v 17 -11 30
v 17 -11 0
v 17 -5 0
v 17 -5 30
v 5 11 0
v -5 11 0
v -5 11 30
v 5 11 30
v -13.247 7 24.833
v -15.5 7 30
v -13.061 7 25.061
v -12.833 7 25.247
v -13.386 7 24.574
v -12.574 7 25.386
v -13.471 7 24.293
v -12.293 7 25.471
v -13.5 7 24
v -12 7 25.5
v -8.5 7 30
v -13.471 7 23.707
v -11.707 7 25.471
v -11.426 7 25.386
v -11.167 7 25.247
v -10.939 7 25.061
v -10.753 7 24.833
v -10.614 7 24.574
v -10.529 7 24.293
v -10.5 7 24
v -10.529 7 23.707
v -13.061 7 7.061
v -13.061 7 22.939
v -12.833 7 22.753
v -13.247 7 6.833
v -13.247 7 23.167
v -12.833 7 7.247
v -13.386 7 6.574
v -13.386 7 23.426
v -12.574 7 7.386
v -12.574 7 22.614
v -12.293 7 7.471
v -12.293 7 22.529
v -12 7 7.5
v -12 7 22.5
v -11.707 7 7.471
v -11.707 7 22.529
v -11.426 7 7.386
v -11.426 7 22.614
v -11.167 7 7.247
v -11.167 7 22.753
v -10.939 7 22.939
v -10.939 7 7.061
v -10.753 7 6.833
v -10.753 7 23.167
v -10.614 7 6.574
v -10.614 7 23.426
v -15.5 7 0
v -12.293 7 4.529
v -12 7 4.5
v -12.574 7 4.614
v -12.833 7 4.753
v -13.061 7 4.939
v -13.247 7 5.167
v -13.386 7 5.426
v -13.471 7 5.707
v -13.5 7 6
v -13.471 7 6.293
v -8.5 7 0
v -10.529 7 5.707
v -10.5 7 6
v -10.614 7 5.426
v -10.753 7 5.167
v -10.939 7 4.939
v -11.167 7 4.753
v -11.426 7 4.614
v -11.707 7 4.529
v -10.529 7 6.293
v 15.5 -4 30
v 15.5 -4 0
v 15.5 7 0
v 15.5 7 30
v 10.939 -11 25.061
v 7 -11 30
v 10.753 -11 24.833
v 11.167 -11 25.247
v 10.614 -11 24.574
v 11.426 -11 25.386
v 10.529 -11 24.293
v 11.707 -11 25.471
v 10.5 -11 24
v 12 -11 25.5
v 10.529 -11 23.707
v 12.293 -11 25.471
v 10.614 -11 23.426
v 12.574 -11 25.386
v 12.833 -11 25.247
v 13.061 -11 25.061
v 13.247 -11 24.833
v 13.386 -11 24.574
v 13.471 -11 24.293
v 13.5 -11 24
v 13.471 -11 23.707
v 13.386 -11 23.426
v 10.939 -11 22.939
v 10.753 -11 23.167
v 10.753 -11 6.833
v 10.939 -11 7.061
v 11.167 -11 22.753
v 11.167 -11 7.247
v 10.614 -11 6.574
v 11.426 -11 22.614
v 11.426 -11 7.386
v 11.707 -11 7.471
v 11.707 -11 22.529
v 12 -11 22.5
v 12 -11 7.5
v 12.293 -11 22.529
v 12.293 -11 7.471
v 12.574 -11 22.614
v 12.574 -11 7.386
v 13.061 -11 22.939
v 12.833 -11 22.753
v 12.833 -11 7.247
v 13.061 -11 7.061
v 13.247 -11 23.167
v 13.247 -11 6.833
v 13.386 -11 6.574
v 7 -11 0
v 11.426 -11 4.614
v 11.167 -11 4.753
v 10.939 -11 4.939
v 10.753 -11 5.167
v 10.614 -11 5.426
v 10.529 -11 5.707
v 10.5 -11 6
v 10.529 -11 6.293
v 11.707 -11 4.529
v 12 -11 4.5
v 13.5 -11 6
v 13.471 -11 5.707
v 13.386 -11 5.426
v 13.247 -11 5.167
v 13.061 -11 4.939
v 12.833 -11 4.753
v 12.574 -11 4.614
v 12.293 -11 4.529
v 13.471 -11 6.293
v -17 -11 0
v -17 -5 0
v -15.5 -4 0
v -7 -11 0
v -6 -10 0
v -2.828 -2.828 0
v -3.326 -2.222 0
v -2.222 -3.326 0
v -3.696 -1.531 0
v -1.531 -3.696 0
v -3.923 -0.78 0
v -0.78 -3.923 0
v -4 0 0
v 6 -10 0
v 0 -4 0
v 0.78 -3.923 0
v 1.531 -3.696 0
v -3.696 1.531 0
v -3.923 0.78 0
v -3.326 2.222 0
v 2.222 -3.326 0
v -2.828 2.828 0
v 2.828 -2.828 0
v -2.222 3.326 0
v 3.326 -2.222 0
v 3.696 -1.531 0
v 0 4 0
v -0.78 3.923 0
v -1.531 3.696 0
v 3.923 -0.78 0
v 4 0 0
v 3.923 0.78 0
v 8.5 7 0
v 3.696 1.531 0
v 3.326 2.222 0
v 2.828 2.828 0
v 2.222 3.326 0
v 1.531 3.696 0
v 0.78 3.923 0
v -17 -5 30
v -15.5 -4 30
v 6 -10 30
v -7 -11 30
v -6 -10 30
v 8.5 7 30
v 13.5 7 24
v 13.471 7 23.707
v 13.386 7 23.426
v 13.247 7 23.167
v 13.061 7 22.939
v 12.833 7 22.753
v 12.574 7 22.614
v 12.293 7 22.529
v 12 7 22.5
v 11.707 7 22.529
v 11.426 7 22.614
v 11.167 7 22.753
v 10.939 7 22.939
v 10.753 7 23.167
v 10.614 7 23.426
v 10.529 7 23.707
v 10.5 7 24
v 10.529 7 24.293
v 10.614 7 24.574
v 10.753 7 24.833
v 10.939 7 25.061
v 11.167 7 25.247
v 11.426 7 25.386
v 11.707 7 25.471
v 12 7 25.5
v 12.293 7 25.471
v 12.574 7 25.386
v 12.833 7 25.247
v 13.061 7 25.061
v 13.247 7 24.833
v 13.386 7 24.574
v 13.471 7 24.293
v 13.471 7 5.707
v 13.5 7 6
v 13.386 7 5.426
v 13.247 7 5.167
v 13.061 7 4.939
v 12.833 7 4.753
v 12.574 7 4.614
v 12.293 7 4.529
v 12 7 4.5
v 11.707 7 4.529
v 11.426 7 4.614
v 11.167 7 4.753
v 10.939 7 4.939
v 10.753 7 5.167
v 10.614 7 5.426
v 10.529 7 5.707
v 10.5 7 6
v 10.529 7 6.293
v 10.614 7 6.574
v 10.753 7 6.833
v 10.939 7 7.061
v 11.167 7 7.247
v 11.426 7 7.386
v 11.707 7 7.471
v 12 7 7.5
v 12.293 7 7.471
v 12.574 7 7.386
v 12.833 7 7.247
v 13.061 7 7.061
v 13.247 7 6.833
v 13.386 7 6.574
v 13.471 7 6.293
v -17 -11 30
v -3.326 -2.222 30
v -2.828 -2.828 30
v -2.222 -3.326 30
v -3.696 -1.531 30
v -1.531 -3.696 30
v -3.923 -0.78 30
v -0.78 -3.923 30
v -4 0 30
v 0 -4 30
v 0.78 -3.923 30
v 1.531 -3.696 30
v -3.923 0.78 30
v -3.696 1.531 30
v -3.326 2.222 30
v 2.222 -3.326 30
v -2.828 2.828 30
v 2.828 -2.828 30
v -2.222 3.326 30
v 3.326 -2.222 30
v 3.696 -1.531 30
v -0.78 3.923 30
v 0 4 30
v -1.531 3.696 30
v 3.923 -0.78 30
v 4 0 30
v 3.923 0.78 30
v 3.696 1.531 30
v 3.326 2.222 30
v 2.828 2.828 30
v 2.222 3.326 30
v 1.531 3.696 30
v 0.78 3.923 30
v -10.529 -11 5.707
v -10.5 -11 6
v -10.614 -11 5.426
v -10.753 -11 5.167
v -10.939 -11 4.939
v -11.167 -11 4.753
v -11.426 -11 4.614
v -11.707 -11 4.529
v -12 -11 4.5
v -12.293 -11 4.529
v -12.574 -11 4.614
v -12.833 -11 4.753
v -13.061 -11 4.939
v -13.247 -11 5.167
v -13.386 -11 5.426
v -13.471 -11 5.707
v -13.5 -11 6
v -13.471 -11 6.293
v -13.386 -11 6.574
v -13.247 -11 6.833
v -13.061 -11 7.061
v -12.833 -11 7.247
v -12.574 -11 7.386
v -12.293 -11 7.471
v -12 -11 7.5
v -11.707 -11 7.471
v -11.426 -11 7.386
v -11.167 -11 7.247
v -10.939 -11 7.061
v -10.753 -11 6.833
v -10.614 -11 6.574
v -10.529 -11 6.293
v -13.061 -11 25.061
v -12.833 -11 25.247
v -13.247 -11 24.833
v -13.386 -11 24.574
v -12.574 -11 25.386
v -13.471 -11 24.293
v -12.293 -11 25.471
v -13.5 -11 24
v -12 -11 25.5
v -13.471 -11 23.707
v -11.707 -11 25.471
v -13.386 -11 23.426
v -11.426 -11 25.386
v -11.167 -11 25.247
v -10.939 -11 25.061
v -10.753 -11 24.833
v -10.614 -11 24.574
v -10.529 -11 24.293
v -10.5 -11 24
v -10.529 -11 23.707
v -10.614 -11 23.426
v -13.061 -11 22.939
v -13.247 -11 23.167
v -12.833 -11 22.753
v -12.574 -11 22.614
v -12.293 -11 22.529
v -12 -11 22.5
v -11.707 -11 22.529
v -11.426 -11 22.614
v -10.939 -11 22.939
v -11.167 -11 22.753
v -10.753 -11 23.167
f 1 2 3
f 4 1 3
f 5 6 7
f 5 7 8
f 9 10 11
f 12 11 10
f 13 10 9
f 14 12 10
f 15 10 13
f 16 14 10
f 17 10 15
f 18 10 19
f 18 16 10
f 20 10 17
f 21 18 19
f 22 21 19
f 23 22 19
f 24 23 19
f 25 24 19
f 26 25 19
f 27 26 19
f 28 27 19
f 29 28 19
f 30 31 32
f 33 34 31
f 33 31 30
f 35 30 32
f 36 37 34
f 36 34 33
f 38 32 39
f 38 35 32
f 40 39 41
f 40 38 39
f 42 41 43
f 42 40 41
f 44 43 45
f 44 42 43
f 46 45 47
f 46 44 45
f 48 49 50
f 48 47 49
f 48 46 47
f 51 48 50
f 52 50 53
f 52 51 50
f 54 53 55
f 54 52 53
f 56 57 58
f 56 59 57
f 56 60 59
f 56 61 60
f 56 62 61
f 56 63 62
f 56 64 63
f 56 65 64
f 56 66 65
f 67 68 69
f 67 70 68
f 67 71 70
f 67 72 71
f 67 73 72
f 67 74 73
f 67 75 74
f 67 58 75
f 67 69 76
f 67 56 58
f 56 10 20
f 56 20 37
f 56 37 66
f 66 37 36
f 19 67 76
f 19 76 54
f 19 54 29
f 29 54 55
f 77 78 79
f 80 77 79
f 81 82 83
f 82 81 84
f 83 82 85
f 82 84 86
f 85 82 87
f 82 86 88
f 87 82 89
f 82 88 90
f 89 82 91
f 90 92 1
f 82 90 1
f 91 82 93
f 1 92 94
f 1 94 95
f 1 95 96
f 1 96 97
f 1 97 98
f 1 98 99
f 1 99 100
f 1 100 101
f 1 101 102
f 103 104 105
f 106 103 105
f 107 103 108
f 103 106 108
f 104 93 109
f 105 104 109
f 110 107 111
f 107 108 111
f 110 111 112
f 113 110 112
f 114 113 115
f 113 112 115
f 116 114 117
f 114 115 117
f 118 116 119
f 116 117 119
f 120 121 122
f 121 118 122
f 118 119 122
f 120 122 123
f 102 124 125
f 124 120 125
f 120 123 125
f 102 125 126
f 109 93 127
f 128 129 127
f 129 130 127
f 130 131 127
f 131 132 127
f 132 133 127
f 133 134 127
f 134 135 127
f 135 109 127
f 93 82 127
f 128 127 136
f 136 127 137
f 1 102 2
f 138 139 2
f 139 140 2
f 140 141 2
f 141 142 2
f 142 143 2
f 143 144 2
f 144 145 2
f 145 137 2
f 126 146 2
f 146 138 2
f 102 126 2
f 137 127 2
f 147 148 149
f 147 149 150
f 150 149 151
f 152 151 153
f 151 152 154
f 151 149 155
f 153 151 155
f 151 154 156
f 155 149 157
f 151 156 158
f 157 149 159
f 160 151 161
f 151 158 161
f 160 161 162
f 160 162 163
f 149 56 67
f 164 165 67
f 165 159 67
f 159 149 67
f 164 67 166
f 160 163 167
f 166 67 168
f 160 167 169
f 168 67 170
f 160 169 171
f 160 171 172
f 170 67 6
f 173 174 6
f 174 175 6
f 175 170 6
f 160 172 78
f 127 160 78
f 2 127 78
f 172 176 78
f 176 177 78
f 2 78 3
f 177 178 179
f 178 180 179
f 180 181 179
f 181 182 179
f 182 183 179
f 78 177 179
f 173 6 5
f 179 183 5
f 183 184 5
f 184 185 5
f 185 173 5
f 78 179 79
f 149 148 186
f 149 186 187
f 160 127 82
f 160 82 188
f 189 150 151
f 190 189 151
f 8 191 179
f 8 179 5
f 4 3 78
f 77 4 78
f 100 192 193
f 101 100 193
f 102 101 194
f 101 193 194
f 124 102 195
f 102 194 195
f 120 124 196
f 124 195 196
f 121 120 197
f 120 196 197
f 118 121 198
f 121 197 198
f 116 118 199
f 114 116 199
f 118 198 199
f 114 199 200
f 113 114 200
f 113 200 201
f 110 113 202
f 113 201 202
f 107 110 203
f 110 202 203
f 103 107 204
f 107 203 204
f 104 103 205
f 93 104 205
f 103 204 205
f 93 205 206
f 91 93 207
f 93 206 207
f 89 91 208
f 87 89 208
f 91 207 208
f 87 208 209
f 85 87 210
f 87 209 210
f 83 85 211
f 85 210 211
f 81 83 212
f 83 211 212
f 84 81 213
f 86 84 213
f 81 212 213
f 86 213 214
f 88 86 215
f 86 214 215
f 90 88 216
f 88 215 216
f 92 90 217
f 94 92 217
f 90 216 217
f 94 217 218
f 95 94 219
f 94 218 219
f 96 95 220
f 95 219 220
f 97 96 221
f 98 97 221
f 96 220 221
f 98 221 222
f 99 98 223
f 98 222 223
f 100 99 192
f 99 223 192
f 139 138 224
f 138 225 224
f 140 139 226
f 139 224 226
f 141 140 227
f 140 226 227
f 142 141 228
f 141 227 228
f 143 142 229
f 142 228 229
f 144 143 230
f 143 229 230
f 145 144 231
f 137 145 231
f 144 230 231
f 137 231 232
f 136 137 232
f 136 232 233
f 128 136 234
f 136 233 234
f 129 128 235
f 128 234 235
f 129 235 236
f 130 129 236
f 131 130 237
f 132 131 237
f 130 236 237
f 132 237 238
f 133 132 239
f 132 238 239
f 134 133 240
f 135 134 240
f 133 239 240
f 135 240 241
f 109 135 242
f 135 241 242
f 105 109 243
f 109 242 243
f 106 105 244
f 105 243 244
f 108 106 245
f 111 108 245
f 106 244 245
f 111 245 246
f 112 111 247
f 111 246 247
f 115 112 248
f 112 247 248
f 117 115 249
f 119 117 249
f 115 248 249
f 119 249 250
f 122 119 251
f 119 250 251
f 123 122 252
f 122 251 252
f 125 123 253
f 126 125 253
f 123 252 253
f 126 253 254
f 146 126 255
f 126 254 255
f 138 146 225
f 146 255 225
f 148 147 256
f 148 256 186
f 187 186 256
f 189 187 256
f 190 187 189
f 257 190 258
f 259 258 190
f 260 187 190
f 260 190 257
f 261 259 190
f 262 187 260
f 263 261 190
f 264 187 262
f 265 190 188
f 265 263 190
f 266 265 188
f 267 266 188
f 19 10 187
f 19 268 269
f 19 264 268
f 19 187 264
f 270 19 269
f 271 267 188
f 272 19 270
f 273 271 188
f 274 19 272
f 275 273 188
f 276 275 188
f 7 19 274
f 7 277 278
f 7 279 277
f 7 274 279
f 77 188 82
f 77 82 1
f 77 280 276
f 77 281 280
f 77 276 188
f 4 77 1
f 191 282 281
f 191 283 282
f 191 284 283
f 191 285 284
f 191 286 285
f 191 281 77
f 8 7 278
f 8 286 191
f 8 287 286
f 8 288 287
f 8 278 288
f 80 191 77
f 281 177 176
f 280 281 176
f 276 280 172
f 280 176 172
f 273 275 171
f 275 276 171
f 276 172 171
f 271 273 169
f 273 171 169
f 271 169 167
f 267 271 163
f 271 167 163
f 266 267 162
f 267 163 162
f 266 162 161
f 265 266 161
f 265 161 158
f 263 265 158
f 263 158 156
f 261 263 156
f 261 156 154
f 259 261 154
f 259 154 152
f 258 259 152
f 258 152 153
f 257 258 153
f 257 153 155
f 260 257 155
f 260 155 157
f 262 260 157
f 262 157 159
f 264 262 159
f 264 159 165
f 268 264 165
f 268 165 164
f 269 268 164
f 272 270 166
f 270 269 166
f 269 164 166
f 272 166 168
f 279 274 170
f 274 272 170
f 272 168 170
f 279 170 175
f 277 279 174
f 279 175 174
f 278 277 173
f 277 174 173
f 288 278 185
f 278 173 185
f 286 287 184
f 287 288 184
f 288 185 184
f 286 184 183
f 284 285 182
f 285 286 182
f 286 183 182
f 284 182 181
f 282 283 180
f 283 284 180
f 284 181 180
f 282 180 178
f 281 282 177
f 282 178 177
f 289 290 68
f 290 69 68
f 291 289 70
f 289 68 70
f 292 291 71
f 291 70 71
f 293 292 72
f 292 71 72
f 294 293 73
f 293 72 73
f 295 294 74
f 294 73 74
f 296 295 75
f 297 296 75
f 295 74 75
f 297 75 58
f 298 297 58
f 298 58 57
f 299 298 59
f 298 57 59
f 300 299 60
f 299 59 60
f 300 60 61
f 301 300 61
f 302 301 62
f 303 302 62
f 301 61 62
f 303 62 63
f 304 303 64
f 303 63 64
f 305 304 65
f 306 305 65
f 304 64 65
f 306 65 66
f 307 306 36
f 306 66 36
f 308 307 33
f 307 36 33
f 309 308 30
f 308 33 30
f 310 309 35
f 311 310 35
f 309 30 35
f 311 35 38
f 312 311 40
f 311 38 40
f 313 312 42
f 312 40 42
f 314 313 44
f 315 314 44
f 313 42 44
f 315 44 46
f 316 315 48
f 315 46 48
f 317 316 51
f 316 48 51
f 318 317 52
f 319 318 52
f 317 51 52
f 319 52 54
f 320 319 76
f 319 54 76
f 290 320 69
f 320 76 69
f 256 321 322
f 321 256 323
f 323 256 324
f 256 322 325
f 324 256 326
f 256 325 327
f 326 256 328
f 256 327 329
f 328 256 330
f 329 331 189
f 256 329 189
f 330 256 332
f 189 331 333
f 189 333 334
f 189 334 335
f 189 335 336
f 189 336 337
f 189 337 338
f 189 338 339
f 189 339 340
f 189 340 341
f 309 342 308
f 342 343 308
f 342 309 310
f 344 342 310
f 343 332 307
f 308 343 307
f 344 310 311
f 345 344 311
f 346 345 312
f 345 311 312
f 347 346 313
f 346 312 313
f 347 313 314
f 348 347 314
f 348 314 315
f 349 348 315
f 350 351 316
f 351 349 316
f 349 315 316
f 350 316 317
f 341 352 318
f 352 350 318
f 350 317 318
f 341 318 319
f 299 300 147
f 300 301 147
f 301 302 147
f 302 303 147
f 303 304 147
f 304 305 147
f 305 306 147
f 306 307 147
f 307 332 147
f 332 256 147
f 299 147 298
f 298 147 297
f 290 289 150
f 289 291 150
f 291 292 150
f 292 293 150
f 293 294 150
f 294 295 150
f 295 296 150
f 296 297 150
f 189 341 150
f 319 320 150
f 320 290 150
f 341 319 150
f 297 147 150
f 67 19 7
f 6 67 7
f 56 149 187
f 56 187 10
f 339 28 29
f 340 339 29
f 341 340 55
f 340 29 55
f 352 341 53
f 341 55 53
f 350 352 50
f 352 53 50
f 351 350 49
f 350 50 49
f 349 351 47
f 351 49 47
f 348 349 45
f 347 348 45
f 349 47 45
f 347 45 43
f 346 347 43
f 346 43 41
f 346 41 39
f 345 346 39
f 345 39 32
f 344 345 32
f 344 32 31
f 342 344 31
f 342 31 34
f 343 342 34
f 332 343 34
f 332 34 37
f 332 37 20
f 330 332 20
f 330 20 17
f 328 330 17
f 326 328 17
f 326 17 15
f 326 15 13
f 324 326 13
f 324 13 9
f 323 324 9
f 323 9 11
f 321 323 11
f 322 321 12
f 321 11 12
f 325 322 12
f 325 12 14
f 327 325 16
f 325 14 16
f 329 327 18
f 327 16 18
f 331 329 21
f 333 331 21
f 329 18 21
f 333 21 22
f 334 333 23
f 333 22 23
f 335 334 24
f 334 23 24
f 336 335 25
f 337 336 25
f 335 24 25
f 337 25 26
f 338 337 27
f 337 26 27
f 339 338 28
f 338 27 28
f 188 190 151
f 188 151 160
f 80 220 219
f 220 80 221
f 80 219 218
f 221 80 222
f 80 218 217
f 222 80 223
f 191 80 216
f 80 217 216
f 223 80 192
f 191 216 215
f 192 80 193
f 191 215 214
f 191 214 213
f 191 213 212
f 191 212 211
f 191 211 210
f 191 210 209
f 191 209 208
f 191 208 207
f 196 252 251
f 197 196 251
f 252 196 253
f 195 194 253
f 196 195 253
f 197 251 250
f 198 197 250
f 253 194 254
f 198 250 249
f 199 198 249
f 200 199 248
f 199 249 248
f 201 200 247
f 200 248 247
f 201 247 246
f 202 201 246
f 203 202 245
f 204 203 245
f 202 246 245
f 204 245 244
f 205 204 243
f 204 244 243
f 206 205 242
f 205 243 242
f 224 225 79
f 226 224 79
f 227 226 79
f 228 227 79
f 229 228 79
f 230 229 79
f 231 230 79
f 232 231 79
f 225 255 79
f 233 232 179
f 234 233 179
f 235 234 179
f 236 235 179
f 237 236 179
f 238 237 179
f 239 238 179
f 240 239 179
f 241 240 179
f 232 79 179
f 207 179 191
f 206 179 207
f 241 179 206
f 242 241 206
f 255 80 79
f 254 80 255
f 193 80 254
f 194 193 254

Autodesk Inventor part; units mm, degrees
ref_plane "YZ Plane" through (0, 0, 0) normal (1, 0, 0) x (0, 1, 0)
ref_plane "XZ Plane" through (0, 0, 0) normal (0, 1, 0) x (-1, 0, 0)
ref_plane "XY Plane" through (0, 0, 0) normal (0, 0, 1) x (1, 0, 0)
sketch "Sketch1" plane through (0, 0, 0) normal (0, 0, 1) x (1, 0, 0)
  circle A0 centre (0, 0) radius 4
  line L0 (-15.5, 0) -> (-15.5, 7)
  line L1 (-15.5, 7) -> (-8.5, 7)
  line L2 (-8.5, 7) -> (-5, 11)
  line L3 (-5, 11) -> (0, 11)
  line L4 (0, -4) -> (-15.5, -4) construction
  line L5 (-15.5, 0) -> (-15.5, -4)
  line L6 (-17, -11) -> (0, -11) construction
  line L7 (-17, -11) -> (-17, -5)
  line L8 (-17, -5) -> (-15.5, -4)
  line L9 (0, -4) -> (0, -11) construction
  line L10 (0, 4) -> (0, 11) construction
  line L11 (15.5, 0) -> (15.5, 7)
  line L12 (15.5, 7) -> (8.5, 7)
  line L13 (8.5, 7) -> (5, 11)
  line L14 (5, 11) -> (0, 11)
  line L15 (15.5, 0) -> (15.5, -4)
  line L16 (17, -11) -> (17, -5)
  line L17 (17, -5) -> (15.5, -4)
  line L18 (-17, -11) -> (-7, -11)
  line L19 (0, -10) -> (-6, -10)
  line L20 (-7, -11) -> (-6, -10)
  line L21 (17, -11) -> (0, -11) construction
  line L22 (0, -10) -> (6, -10)
  line L23 (7, -11) -> (6, -10)
  line L24 (7, -11) -> (17, -11)
  dimension "d0" = 8
  dimension "d1" = 15.5
  dimension "d2" = 11
  dimension "d3" = 17
  dimension "d4" = 6
  dimension "d5" = 18
  dimension "d6" = 22
  dimension "d7" = 5
  dimension "d8" = 7
  dimension "d19" = 10
  dimension "d20" = 1
  dimension "d21" = 6
extrude "Extrusion1" add sketch "Sketch1" along normal blind 30
sketch "Sketch2" plane through (-15.5, 7, 0) normal (0, 1, 0) x (1, 0, 0)
  circle A0 centre (3.5, -6) radius 1.5
  line L0 (15.5, 0) -> (15.5, -30) construction
  line L1 (32.5, 0) -> (32.5, -30) construction
  line L2 (32.5, -15) -> (-1.5, -15) construction
  line L3 (-1.5, 0) -> (-1.5, -30) construction
  line L4 (27.5, -24) -> (3.5, -24) construction
  line L5 (3.5, -24) -> (3.5, -6) construction
  line L6 (3.5, -6) -> (27.5, -6) construction
  line L7 (27.5, -6) -> (27.5, -24) construction
  line L8 (27.5, -24) -> (3.5, -6) construction
  line L9 (3.5, -24) -> (27.5, -6) construction
  circle A1 centre (27.5, -6) radius 1.5
  circle A2 centre (27.5, -24) radius 1.5
  circle A3 centre (3.5, -24) radius 1.5
  point P0 (15.5, -15)
  dimension "d11" = 3
  dimension "d12" = 24
  dimension "d13" = 18
  dimension "d14" = 3
  dimension "d15" = 3
  dimension "d16" = 3
extrude "Extrusion2" cut sketch "Sketch2" against normal through all
equation "\"d14\" = d11"
equation "\"d15\" = d11"
equation "\"d16\" = d11"
properties part number "Linear Bearing 8mm Square"
